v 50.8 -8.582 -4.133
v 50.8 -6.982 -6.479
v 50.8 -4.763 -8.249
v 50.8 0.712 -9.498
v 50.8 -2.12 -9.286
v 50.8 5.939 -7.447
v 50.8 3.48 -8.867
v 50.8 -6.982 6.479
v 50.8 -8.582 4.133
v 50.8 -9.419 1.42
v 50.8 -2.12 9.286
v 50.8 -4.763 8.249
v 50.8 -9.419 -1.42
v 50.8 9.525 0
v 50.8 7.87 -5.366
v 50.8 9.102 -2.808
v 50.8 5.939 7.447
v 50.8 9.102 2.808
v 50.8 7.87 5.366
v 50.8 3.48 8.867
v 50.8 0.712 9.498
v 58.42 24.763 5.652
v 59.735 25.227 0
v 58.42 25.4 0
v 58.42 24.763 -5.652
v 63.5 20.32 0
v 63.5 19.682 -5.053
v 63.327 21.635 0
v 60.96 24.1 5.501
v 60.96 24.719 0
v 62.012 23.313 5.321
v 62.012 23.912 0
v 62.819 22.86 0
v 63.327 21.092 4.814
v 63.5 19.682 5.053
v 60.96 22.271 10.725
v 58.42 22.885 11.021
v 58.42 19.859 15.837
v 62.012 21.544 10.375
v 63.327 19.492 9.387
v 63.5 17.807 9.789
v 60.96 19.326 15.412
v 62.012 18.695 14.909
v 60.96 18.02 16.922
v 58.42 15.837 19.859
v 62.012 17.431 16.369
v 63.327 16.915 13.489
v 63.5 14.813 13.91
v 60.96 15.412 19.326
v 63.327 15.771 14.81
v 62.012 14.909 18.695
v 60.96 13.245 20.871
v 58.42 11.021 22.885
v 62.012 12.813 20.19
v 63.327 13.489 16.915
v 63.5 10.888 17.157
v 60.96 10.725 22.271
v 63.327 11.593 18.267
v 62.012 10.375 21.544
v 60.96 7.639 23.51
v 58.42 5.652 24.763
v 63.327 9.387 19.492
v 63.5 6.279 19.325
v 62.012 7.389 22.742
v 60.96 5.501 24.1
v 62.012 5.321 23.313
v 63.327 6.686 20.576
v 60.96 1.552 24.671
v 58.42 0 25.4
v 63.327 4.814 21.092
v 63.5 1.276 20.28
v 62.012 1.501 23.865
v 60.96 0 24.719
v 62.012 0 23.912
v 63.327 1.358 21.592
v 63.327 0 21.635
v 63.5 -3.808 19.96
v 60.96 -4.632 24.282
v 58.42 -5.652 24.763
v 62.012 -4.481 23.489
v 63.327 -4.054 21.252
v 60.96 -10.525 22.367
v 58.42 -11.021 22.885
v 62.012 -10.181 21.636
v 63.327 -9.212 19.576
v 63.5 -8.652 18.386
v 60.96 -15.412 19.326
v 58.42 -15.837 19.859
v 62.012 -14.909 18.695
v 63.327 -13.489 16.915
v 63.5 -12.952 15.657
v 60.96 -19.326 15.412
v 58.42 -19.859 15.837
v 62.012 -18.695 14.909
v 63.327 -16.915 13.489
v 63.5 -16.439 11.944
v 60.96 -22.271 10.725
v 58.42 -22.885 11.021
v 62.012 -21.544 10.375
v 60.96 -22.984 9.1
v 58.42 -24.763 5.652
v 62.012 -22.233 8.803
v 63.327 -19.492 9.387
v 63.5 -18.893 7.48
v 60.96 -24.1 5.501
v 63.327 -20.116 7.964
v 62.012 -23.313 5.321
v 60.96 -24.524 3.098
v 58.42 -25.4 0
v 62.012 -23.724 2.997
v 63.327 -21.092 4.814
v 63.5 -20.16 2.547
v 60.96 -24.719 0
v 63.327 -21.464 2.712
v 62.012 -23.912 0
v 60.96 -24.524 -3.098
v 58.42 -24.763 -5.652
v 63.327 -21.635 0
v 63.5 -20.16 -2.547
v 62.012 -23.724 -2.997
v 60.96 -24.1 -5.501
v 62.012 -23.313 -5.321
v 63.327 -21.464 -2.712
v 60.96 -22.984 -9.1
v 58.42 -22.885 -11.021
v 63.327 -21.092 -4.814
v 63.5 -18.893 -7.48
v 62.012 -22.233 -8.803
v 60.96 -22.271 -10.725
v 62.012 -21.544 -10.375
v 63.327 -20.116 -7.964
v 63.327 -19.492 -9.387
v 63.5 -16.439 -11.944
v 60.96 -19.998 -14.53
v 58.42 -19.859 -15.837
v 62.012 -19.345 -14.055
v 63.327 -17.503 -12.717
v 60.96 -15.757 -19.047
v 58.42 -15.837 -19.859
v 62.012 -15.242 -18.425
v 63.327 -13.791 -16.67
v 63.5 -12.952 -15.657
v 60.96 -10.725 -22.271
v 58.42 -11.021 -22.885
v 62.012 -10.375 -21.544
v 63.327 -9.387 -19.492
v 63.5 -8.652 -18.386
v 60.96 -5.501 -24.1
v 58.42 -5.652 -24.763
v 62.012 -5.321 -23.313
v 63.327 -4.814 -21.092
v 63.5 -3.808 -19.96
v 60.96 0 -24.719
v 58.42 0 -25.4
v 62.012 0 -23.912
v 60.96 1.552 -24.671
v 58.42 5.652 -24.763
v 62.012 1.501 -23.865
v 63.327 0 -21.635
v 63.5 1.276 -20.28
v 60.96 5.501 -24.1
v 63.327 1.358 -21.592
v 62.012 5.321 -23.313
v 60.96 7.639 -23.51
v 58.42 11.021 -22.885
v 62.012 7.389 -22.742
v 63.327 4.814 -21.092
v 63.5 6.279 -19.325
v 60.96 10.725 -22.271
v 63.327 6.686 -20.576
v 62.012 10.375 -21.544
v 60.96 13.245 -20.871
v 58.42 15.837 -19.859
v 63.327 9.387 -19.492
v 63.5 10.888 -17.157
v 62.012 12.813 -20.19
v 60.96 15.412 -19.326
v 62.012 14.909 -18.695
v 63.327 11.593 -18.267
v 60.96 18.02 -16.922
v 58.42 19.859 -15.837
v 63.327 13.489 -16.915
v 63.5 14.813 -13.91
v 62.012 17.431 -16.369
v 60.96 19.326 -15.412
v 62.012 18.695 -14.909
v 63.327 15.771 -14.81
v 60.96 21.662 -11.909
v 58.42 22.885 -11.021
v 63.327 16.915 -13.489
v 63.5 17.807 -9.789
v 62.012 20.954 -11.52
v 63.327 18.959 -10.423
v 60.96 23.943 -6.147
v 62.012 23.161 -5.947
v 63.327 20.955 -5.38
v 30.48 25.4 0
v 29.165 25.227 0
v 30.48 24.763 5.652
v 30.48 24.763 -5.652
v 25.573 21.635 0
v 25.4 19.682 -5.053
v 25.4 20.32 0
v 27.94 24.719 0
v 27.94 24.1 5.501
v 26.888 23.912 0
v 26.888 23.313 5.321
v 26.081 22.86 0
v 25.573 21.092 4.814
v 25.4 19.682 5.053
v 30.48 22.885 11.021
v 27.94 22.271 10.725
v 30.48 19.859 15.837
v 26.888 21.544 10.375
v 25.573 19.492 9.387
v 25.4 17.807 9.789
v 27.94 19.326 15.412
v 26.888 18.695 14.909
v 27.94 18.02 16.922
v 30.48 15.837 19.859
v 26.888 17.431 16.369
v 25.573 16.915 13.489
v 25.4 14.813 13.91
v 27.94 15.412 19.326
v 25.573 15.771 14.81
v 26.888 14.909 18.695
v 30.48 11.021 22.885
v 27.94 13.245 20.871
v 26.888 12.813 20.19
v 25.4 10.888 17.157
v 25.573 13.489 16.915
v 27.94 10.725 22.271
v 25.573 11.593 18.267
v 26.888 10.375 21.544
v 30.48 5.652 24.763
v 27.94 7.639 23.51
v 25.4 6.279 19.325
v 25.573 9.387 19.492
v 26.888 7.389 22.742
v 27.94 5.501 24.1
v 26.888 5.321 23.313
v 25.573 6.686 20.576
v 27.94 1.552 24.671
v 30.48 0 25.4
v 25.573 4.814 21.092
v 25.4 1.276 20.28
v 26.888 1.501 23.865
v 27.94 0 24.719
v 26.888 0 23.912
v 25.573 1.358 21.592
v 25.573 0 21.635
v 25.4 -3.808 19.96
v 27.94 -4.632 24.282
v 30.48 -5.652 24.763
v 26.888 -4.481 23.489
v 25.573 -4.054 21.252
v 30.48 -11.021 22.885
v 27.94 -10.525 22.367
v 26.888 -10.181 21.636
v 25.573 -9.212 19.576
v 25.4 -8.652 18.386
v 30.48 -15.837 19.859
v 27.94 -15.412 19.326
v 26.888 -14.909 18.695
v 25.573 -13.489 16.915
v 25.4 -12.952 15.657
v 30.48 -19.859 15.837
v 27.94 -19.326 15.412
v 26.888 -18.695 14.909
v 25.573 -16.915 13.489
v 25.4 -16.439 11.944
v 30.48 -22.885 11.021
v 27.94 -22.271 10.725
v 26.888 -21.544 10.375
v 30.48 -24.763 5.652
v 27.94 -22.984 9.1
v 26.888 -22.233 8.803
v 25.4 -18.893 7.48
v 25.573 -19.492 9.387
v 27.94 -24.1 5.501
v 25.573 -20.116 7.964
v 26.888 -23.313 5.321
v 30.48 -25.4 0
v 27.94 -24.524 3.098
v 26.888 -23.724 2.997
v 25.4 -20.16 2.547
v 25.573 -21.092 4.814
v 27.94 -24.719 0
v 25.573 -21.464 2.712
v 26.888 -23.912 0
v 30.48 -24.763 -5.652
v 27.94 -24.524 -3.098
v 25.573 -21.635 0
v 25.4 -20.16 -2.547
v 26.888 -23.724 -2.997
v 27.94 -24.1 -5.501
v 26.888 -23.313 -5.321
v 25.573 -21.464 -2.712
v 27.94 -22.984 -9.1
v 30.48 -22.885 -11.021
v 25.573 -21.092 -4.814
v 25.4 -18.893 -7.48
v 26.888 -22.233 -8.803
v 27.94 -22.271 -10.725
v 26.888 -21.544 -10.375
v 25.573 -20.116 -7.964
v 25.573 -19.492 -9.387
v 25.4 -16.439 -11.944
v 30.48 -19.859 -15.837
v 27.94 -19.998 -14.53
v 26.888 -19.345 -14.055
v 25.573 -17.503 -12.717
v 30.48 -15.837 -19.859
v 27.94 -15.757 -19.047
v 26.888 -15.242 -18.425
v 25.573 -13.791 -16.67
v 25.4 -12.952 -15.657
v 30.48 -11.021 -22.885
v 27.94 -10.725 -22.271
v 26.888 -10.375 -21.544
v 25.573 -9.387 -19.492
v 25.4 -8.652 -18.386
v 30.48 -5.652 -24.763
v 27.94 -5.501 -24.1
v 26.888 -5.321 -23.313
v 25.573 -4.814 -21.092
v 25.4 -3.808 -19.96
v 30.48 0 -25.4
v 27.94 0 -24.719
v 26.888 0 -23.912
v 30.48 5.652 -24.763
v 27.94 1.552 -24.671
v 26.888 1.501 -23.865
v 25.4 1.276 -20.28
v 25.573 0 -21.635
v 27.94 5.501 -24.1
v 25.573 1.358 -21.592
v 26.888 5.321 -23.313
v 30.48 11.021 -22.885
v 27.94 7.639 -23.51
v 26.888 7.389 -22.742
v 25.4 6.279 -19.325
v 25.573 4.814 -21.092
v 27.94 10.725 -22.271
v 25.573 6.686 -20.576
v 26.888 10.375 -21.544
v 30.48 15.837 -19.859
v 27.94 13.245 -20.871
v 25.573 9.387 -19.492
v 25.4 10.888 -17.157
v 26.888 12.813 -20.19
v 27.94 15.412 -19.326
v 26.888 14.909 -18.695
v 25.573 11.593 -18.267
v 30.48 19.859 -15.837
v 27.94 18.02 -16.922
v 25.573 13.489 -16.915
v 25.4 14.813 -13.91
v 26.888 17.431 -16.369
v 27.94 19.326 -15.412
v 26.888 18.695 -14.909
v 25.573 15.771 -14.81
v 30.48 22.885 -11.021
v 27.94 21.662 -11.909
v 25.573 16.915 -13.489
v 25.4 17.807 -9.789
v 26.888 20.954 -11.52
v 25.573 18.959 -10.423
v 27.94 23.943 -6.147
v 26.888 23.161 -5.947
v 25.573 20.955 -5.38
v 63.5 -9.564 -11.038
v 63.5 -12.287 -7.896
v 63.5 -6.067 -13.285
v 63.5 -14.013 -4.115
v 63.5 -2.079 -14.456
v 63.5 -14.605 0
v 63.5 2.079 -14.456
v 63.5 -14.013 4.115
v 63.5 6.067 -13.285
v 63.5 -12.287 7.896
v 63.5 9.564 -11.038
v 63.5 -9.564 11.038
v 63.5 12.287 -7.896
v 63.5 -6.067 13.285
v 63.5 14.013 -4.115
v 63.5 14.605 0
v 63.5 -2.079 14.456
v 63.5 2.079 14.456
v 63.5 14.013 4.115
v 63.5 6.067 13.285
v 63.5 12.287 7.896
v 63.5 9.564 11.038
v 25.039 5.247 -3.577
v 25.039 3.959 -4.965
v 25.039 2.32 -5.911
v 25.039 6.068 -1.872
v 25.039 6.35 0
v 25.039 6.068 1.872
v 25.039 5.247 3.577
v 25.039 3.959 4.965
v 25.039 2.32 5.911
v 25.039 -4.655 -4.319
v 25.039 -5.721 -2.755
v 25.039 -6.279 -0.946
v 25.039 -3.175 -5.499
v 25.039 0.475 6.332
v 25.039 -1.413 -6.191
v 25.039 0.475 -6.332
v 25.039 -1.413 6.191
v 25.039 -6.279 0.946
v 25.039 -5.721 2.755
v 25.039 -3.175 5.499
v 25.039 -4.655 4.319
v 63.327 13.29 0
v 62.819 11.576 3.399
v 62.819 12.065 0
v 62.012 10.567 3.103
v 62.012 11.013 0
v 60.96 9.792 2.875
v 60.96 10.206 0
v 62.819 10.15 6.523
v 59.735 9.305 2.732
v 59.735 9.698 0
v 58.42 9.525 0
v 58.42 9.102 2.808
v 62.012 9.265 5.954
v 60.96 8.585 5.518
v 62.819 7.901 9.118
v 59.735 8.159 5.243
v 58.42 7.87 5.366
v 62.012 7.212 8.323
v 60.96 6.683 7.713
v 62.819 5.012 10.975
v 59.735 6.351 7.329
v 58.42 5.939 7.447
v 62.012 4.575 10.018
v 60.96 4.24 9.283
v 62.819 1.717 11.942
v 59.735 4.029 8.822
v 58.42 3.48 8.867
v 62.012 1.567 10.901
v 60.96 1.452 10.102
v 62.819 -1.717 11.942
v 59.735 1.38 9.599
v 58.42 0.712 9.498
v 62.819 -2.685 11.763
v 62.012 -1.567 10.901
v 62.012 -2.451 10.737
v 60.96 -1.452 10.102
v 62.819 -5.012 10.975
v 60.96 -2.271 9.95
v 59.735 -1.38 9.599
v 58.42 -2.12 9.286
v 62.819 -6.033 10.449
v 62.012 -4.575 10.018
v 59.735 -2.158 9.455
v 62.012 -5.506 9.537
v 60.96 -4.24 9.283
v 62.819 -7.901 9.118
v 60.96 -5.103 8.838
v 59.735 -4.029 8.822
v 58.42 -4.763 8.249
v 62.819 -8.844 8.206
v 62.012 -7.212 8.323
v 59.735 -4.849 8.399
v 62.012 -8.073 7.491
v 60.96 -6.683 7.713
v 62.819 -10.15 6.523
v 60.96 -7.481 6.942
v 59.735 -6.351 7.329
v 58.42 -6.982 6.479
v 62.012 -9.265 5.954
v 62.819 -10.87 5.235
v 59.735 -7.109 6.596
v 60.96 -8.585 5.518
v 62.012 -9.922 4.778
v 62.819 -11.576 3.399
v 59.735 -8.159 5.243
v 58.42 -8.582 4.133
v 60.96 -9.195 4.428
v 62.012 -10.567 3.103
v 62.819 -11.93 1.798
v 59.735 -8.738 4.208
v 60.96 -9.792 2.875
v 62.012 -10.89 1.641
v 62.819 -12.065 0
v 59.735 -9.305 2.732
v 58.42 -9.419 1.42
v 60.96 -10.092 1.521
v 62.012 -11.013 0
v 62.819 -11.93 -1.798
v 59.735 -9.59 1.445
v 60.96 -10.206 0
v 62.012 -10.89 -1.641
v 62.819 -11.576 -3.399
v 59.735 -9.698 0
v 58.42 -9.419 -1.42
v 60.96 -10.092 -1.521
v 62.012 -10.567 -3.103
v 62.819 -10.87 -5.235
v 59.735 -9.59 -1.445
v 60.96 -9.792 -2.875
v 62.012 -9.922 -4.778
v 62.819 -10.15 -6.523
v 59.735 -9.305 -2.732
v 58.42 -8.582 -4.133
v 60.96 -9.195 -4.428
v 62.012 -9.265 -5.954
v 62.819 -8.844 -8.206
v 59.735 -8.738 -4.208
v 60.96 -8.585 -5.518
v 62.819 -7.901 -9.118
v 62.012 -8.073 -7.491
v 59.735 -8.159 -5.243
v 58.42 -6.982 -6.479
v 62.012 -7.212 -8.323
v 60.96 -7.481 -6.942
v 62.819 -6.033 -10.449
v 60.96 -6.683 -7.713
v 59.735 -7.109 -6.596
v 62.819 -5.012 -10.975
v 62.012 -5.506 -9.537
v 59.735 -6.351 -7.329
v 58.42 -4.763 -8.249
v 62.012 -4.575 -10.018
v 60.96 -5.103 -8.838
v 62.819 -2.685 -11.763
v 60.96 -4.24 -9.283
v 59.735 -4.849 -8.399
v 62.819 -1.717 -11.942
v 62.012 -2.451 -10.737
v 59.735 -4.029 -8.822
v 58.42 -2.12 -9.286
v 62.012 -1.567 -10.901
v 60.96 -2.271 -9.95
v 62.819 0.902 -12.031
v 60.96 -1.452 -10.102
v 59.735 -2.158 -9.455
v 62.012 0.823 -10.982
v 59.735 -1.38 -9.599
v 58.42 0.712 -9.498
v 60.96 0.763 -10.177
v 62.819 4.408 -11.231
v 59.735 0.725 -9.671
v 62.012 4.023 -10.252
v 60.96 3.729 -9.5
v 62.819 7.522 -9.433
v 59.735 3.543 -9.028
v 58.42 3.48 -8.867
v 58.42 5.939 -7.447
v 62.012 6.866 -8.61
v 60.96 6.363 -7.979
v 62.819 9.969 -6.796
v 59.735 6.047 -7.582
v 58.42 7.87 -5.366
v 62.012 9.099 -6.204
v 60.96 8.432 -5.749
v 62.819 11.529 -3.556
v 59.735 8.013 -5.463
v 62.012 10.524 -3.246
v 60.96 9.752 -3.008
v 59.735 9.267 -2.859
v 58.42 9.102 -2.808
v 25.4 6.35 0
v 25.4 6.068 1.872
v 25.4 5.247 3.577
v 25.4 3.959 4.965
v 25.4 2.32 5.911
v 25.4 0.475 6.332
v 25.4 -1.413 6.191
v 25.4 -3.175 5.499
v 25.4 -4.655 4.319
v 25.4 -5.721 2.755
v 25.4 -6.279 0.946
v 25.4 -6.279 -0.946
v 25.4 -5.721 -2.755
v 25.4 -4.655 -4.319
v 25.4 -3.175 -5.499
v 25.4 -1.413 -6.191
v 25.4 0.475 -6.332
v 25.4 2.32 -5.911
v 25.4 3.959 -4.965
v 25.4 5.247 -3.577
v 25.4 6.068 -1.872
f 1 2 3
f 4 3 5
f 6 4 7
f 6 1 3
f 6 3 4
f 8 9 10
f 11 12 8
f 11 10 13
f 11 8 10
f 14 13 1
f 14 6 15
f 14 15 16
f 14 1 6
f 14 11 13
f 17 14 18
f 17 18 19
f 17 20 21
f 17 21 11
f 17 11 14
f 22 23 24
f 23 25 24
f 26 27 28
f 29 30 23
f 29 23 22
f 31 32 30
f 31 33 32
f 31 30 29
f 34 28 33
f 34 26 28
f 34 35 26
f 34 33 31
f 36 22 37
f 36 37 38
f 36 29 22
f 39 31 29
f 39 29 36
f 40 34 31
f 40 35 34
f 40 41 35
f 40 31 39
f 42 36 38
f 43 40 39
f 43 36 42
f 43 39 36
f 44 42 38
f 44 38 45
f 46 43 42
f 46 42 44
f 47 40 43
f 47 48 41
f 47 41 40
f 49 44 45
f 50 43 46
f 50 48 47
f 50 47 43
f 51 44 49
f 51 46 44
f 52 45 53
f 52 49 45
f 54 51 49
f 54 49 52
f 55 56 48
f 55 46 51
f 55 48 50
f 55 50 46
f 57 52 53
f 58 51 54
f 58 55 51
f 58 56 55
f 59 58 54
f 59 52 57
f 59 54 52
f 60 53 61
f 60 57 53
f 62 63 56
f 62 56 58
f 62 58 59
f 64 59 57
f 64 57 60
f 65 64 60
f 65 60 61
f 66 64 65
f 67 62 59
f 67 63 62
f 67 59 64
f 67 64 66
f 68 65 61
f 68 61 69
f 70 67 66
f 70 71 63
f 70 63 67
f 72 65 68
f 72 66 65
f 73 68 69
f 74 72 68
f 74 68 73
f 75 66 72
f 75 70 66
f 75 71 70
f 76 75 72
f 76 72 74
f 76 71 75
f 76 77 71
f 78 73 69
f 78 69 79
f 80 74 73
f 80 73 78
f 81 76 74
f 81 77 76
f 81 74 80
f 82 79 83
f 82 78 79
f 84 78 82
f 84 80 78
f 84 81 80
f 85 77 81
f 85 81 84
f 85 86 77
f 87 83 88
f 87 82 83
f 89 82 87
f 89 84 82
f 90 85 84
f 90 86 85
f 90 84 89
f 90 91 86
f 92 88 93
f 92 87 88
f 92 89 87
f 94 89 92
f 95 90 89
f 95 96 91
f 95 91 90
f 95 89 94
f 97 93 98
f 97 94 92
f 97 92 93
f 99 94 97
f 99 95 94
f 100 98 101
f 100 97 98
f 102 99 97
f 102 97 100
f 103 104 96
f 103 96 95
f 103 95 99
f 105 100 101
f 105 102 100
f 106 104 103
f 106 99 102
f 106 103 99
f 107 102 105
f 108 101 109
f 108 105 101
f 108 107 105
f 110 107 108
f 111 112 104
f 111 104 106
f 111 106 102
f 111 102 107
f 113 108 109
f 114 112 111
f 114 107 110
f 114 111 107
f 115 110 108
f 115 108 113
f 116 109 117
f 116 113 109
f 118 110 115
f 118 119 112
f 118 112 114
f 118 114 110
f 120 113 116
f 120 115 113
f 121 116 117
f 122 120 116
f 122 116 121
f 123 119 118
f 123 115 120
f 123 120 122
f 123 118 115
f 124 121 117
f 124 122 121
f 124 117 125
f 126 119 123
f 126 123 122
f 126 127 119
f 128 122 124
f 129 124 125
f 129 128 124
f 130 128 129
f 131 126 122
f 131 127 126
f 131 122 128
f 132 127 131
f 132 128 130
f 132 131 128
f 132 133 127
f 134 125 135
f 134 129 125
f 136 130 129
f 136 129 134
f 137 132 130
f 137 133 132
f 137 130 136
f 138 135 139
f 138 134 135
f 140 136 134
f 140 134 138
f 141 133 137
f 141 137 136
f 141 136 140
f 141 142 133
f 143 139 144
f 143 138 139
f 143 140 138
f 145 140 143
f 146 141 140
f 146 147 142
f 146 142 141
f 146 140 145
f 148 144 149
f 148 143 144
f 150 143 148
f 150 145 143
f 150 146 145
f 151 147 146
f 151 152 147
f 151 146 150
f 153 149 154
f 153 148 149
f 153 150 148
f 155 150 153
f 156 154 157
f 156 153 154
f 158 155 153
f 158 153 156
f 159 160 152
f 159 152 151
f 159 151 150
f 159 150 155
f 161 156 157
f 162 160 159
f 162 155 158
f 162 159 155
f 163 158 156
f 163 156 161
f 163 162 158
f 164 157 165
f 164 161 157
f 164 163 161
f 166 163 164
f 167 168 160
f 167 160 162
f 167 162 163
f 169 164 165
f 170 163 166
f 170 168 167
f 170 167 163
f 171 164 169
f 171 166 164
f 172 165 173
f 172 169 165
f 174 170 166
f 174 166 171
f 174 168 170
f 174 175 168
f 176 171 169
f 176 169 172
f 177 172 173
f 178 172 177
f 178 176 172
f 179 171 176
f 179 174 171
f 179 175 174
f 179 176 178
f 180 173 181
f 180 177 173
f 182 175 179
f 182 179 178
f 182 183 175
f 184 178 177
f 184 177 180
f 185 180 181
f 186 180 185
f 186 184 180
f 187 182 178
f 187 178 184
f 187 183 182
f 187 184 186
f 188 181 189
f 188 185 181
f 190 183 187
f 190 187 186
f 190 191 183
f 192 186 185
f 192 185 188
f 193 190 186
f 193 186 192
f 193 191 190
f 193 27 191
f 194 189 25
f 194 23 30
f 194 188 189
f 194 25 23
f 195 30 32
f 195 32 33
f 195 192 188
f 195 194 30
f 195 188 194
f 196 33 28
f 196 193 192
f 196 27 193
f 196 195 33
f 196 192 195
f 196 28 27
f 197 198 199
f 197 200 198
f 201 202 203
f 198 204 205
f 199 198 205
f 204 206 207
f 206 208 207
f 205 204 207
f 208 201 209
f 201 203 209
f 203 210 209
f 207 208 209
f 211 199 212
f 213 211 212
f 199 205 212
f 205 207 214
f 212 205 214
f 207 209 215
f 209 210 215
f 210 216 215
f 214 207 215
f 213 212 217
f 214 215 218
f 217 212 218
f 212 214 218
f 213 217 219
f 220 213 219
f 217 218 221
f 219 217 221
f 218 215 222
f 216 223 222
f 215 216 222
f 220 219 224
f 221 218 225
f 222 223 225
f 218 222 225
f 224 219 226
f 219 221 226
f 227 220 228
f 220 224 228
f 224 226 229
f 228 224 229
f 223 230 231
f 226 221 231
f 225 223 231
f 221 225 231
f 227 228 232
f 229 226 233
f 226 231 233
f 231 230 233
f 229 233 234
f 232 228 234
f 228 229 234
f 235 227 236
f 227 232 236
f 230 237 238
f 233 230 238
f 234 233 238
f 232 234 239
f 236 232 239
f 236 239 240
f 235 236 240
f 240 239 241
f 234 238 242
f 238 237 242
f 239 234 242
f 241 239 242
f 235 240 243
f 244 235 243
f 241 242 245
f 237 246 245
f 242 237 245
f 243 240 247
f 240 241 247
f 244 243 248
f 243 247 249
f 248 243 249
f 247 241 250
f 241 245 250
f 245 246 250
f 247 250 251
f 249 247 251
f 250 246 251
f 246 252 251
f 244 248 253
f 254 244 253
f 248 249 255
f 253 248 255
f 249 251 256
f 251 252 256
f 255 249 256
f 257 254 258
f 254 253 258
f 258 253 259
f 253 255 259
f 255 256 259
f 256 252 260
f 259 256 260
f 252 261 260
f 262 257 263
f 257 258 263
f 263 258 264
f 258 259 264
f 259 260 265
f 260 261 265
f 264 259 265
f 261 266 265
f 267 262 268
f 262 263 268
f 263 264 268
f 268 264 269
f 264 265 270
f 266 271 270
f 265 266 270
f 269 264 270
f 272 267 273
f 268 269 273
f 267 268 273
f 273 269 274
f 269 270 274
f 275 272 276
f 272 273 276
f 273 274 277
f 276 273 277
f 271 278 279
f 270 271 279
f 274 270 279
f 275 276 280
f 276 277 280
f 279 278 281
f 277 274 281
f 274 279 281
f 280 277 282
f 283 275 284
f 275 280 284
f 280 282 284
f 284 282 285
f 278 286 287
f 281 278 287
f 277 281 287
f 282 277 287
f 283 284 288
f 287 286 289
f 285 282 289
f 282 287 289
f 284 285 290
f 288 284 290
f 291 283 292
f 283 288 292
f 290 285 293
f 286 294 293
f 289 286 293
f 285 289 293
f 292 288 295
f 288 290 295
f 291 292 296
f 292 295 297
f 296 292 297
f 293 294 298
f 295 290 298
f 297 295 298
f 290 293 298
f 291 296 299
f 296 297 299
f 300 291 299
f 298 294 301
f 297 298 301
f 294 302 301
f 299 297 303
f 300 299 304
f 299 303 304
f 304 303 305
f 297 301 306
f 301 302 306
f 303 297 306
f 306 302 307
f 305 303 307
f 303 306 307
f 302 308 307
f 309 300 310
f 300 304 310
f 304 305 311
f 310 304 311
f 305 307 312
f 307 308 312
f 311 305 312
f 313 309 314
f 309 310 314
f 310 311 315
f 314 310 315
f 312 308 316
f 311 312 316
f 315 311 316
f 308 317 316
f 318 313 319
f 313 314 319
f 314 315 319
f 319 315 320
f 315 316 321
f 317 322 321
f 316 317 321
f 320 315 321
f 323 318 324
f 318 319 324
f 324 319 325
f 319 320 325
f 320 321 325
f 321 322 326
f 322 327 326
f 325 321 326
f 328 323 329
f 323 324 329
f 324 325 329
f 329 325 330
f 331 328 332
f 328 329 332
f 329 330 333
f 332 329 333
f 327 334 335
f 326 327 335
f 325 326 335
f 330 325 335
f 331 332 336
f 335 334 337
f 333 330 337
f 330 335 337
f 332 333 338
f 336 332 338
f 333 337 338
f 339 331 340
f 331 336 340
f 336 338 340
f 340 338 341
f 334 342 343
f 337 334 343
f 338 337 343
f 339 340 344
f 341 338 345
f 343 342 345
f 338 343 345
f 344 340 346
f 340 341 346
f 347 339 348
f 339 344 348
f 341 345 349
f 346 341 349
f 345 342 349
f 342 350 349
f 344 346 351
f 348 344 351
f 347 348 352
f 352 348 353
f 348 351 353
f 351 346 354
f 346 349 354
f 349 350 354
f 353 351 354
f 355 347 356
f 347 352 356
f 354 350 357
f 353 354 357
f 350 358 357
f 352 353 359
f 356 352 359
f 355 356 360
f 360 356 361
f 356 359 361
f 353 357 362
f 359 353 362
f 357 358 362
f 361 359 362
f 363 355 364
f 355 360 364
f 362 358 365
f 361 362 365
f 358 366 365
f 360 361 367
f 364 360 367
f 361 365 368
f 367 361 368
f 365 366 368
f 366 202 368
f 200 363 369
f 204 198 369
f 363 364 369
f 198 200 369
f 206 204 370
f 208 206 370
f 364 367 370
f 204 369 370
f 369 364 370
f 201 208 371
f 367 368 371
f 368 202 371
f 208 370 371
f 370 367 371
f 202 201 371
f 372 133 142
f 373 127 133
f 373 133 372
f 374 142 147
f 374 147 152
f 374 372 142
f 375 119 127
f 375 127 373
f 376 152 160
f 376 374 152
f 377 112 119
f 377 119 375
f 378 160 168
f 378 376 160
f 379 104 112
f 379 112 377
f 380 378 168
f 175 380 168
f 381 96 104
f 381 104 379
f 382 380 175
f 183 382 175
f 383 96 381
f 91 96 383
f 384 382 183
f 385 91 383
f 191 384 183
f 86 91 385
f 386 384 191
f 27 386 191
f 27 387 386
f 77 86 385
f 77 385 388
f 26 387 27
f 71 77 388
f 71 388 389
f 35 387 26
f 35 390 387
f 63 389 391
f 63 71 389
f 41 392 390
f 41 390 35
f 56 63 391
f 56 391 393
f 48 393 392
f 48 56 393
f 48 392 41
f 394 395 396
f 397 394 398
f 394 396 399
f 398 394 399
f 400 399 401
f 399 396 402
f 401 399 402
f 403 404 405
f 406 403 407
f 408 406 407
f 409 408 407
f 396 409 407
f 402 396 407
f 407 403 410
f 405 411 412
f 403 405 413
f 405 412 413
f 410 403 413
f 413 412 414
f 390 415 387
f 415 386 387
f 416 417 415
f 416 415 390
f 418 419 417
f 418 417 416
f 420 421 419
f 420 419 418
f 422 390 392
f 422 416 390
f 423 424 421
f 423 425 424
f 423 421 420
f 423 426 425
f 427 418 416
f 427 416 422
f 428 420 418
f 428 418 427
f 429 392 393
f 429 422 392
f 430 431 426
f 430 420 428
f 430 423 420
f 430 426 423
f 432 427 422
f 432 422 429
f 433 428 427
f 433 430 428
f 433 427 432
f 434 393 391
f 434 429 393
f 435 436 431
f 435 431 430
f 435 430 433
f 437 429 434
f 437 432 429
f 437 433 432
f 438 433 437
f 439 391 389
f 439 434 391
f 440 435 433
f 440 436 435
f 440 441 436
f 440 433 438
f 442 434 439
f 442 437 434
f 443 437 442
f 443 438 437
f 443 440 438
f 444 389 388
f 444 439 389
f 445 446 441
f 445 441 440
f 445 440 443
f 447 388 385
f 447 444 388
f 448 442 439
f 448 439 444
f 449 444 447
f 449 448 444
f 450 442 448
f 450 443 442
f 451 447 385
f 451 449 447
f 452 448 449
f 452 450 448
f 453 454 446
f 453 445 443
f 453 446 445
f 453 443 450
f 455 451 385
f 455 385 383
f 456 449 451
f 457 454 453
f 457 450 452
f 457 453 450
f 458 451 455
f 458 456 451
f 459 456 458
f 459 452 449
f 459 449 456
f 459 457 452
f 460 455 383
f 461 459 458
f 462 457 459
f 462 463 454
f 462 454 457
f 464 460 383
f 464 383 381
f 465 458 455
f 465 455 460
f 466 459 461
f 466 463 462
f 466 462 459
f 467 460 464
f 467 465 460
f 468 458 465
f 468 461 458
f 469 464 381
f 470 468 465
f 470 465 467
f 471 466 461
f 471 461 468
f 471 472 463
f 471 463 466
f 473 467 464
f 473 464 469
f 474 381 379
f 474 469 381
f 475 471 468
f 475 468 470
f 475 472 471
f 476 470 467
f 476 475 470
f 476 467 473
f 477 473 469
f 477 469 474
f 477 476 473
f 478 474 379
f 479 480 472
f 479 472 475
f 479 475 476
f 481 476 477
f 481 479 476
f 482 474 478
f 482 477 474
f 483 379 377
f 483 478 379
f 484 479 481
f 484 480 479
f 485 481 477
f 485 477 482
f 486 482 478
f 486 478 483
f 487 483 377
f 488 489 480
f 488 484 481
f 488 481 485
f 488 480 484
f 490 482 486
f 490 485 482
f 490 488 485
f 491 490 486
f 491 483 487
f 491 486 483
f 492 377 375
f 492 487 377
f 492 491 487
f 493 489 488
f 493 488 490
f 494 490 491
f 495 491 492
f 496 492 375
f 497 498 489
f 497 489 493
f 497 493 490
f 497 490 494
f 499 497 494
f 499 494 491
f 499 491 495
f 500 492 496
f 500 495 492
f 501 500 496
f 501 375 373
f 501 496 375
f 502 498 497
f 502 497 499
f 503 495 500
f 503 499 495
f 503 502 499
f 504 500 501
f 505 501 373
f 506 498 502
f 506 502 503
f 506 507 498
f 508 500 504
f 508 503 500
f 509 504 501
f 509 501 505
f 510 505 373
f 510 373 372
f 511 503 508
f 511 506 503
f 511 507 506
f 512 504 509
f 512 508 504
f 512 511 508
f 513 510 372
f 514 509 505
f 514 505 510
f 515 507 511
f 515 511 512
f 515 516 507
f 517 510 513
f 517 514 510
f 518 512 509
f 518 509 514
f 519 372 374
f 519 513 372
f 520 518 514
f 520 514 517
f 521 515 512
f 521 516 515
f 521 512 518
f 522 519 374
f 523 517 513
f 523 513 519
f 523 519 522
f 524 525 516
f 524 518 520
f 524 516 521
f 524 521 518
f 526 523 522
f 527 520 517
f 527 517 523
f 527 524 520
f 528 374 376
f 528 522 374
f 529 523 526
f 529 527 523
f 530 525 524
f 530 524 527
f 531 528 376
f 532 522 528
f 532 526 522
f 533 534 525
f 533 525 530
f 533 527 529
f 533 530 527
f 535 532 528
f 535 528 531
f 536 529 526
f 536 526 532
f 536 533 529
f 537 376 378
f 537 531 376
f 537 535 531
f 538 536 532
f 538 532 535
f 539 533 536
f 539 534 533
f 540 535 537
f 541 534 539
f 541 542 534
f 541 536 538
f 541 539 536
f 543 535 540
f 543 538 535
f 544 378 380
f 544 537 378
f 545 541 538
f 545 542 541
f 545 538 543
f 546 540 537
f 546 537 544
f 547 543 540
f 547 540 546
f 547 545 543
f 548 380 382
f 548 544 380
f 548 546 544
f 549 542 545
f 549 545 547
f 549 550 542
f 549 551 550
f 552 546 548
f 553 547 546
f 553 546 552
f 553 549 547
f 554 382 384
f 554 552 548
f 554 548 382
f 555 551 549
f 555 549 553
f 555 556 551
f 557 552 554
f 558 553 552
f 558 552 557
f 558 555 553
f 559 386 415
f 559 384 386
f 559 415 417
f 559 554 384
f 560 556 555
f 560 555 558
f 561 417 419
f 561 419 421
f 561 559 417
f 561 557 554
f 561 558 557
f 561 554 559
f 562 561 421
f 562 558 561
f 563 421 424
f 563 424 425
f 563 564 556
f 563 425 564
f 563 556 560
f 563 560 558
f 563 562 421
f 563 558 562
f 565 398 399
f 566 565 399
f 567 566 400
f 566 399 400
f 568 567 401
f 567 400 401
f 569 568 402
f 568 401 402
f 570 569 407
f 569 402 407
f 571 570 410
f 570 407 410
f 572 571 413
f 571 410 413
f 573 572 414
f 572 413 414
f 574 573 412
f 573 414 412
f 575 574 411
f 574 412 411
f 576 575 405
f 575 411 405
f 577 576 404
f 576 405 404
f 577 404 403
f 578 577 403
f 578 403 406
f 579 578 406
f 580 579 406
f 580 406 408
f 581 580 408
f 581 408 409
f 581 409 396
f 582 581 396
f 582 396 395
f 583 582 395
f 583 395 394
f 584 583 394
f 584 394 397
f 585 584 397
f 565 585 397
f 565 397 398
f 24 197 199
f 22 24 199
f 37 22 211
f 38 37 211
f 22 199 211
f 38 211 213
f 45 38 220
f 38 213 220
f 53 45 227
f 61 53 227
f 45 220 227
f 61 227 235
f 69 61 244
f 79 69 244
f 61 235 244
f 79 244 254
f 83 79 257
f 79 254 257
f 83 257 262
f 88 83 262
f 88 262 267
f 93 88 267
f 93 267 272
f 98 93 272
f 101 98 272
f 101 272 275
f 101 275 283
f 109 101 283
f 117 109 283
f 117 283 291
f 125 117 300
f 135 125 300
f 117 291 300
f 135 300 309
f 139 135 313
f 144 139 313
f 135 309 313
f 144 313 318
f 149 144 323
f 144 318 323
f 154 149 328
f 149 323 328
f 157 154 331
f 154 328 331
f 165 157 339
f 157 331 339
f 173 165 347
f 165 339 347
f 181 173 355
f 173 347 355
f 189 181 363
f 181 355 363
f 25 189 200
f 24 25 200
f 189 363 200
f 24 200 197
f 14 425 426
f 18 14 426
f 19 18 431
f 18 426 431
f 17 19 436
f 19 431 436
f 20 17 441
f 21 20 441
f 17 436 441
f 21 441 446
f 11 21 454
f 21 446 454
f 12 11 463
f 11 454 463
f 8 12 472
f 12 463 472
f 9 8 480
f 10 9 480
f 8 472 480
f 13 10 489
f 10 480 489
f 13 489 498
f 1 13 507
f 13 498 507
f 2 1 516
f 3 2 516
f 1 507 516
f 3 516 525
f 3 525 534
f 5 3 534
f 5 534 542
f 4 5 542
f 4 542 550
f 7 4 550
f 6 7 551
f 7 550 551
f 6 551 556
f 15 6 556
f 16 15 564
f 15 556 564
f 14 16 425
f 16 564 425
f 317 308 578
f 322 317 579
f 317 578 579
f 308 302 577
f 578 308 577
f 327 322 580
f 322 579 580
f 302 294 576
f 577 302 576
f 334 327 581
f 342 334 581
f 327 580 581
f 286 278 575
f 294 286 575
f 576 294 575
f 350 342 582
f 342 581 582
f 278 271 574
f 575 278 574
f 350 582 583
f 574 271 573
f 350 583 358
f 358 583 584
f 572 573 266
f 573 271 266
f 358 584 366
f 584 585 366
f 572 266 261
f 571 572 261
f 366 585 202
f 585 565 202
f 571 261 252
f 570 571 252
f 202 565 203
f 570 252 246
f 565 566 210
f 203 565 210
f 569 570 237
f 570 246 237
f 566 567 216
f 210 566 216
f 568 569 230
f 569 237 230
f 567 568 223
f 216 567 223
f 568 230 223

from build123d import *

# Parameters (mm, degrees)
F0_R      = 6.35
F1_DEPTH  = 25.4
F2_R      = 25.4
F3_DEPTH  = 38.1
F4_R      = 9.525
F5_DEPTH  = 12.7
F6_R      = 5.08
F7_W      = 38.8537757099
F7_H      = 29.6439938247
F8_DEPTH  = 25.4
F9_DEPTH  = 25.4
F10_DEPTH = 25.4
F11_DEPTH = 56.134


with BuildPart() as f1:
    # F0 (on Right) → F1 (new body)
    with BuildSketch(Plane.YZ):
        Circle(F0_R)
    extrude(amount=F1_DEPTH)

    # F2 (on face) → F3 (join)
    with BuildSketch(Plane.YZ.offset(25.4)):
        Circle(F2_R)
    extrude(amount=F3_DEPTH)

    # F4 (on face) → F5 (cut)
    with BuildSketch(Plane.YZ.offset(63.5)):
        Circle(F4_R)
    extrude(amount=-F5_DEPTH, mode=Mode.SUBTRACT)

    # F6
    f6_edges = [f1.edges().sort_by_distance(p)[0] for p in [
        (63.5, -25.4, 0),
        (63.5, -9.525, 0),
        (25.4, -25.4, 0),
    ]]
    fillet(f6_edges, radius=F6_R)

    # F7 (on Front) → F8 (join)
    with BuildSketch(Plane.XZ):
        with Locations((5.6122131646, 4.7487951815)):
            Rectangle(F7_W, F7_H)
    extrude(amount=F8_DEPTH)

    # F9 (add): a face of the model
    f9_faces = [f1.faces().sort_by_distance(p)[0] for p in [
        (2.9778278266, 0, 6.5599353899),
    ]]
    extrude(f9_faces, amount=F9_DEPTH)

    # F10 (cut): a face of the model
    f10_faces = [f1.faces().sort_by_distance(p)[0] for p in [
        (2.9778278266, 25.4, 6.5599353899),
    ]]
    extrude(f10_faces, amount=-F10_DEPTH, mode=Mode.SUBTRACT)

    # F11 (cut): a face of the model
    f11_faces = [f1.faces().sort_by_distance(p)[0] for p in [
        (5.6122131646, -25.4, 4.7487951815),
    ]]
    extrude(f11_faces, amount=-F11_DEPTH, mode=Mode.SUBTRACT)


solid = f1.part
